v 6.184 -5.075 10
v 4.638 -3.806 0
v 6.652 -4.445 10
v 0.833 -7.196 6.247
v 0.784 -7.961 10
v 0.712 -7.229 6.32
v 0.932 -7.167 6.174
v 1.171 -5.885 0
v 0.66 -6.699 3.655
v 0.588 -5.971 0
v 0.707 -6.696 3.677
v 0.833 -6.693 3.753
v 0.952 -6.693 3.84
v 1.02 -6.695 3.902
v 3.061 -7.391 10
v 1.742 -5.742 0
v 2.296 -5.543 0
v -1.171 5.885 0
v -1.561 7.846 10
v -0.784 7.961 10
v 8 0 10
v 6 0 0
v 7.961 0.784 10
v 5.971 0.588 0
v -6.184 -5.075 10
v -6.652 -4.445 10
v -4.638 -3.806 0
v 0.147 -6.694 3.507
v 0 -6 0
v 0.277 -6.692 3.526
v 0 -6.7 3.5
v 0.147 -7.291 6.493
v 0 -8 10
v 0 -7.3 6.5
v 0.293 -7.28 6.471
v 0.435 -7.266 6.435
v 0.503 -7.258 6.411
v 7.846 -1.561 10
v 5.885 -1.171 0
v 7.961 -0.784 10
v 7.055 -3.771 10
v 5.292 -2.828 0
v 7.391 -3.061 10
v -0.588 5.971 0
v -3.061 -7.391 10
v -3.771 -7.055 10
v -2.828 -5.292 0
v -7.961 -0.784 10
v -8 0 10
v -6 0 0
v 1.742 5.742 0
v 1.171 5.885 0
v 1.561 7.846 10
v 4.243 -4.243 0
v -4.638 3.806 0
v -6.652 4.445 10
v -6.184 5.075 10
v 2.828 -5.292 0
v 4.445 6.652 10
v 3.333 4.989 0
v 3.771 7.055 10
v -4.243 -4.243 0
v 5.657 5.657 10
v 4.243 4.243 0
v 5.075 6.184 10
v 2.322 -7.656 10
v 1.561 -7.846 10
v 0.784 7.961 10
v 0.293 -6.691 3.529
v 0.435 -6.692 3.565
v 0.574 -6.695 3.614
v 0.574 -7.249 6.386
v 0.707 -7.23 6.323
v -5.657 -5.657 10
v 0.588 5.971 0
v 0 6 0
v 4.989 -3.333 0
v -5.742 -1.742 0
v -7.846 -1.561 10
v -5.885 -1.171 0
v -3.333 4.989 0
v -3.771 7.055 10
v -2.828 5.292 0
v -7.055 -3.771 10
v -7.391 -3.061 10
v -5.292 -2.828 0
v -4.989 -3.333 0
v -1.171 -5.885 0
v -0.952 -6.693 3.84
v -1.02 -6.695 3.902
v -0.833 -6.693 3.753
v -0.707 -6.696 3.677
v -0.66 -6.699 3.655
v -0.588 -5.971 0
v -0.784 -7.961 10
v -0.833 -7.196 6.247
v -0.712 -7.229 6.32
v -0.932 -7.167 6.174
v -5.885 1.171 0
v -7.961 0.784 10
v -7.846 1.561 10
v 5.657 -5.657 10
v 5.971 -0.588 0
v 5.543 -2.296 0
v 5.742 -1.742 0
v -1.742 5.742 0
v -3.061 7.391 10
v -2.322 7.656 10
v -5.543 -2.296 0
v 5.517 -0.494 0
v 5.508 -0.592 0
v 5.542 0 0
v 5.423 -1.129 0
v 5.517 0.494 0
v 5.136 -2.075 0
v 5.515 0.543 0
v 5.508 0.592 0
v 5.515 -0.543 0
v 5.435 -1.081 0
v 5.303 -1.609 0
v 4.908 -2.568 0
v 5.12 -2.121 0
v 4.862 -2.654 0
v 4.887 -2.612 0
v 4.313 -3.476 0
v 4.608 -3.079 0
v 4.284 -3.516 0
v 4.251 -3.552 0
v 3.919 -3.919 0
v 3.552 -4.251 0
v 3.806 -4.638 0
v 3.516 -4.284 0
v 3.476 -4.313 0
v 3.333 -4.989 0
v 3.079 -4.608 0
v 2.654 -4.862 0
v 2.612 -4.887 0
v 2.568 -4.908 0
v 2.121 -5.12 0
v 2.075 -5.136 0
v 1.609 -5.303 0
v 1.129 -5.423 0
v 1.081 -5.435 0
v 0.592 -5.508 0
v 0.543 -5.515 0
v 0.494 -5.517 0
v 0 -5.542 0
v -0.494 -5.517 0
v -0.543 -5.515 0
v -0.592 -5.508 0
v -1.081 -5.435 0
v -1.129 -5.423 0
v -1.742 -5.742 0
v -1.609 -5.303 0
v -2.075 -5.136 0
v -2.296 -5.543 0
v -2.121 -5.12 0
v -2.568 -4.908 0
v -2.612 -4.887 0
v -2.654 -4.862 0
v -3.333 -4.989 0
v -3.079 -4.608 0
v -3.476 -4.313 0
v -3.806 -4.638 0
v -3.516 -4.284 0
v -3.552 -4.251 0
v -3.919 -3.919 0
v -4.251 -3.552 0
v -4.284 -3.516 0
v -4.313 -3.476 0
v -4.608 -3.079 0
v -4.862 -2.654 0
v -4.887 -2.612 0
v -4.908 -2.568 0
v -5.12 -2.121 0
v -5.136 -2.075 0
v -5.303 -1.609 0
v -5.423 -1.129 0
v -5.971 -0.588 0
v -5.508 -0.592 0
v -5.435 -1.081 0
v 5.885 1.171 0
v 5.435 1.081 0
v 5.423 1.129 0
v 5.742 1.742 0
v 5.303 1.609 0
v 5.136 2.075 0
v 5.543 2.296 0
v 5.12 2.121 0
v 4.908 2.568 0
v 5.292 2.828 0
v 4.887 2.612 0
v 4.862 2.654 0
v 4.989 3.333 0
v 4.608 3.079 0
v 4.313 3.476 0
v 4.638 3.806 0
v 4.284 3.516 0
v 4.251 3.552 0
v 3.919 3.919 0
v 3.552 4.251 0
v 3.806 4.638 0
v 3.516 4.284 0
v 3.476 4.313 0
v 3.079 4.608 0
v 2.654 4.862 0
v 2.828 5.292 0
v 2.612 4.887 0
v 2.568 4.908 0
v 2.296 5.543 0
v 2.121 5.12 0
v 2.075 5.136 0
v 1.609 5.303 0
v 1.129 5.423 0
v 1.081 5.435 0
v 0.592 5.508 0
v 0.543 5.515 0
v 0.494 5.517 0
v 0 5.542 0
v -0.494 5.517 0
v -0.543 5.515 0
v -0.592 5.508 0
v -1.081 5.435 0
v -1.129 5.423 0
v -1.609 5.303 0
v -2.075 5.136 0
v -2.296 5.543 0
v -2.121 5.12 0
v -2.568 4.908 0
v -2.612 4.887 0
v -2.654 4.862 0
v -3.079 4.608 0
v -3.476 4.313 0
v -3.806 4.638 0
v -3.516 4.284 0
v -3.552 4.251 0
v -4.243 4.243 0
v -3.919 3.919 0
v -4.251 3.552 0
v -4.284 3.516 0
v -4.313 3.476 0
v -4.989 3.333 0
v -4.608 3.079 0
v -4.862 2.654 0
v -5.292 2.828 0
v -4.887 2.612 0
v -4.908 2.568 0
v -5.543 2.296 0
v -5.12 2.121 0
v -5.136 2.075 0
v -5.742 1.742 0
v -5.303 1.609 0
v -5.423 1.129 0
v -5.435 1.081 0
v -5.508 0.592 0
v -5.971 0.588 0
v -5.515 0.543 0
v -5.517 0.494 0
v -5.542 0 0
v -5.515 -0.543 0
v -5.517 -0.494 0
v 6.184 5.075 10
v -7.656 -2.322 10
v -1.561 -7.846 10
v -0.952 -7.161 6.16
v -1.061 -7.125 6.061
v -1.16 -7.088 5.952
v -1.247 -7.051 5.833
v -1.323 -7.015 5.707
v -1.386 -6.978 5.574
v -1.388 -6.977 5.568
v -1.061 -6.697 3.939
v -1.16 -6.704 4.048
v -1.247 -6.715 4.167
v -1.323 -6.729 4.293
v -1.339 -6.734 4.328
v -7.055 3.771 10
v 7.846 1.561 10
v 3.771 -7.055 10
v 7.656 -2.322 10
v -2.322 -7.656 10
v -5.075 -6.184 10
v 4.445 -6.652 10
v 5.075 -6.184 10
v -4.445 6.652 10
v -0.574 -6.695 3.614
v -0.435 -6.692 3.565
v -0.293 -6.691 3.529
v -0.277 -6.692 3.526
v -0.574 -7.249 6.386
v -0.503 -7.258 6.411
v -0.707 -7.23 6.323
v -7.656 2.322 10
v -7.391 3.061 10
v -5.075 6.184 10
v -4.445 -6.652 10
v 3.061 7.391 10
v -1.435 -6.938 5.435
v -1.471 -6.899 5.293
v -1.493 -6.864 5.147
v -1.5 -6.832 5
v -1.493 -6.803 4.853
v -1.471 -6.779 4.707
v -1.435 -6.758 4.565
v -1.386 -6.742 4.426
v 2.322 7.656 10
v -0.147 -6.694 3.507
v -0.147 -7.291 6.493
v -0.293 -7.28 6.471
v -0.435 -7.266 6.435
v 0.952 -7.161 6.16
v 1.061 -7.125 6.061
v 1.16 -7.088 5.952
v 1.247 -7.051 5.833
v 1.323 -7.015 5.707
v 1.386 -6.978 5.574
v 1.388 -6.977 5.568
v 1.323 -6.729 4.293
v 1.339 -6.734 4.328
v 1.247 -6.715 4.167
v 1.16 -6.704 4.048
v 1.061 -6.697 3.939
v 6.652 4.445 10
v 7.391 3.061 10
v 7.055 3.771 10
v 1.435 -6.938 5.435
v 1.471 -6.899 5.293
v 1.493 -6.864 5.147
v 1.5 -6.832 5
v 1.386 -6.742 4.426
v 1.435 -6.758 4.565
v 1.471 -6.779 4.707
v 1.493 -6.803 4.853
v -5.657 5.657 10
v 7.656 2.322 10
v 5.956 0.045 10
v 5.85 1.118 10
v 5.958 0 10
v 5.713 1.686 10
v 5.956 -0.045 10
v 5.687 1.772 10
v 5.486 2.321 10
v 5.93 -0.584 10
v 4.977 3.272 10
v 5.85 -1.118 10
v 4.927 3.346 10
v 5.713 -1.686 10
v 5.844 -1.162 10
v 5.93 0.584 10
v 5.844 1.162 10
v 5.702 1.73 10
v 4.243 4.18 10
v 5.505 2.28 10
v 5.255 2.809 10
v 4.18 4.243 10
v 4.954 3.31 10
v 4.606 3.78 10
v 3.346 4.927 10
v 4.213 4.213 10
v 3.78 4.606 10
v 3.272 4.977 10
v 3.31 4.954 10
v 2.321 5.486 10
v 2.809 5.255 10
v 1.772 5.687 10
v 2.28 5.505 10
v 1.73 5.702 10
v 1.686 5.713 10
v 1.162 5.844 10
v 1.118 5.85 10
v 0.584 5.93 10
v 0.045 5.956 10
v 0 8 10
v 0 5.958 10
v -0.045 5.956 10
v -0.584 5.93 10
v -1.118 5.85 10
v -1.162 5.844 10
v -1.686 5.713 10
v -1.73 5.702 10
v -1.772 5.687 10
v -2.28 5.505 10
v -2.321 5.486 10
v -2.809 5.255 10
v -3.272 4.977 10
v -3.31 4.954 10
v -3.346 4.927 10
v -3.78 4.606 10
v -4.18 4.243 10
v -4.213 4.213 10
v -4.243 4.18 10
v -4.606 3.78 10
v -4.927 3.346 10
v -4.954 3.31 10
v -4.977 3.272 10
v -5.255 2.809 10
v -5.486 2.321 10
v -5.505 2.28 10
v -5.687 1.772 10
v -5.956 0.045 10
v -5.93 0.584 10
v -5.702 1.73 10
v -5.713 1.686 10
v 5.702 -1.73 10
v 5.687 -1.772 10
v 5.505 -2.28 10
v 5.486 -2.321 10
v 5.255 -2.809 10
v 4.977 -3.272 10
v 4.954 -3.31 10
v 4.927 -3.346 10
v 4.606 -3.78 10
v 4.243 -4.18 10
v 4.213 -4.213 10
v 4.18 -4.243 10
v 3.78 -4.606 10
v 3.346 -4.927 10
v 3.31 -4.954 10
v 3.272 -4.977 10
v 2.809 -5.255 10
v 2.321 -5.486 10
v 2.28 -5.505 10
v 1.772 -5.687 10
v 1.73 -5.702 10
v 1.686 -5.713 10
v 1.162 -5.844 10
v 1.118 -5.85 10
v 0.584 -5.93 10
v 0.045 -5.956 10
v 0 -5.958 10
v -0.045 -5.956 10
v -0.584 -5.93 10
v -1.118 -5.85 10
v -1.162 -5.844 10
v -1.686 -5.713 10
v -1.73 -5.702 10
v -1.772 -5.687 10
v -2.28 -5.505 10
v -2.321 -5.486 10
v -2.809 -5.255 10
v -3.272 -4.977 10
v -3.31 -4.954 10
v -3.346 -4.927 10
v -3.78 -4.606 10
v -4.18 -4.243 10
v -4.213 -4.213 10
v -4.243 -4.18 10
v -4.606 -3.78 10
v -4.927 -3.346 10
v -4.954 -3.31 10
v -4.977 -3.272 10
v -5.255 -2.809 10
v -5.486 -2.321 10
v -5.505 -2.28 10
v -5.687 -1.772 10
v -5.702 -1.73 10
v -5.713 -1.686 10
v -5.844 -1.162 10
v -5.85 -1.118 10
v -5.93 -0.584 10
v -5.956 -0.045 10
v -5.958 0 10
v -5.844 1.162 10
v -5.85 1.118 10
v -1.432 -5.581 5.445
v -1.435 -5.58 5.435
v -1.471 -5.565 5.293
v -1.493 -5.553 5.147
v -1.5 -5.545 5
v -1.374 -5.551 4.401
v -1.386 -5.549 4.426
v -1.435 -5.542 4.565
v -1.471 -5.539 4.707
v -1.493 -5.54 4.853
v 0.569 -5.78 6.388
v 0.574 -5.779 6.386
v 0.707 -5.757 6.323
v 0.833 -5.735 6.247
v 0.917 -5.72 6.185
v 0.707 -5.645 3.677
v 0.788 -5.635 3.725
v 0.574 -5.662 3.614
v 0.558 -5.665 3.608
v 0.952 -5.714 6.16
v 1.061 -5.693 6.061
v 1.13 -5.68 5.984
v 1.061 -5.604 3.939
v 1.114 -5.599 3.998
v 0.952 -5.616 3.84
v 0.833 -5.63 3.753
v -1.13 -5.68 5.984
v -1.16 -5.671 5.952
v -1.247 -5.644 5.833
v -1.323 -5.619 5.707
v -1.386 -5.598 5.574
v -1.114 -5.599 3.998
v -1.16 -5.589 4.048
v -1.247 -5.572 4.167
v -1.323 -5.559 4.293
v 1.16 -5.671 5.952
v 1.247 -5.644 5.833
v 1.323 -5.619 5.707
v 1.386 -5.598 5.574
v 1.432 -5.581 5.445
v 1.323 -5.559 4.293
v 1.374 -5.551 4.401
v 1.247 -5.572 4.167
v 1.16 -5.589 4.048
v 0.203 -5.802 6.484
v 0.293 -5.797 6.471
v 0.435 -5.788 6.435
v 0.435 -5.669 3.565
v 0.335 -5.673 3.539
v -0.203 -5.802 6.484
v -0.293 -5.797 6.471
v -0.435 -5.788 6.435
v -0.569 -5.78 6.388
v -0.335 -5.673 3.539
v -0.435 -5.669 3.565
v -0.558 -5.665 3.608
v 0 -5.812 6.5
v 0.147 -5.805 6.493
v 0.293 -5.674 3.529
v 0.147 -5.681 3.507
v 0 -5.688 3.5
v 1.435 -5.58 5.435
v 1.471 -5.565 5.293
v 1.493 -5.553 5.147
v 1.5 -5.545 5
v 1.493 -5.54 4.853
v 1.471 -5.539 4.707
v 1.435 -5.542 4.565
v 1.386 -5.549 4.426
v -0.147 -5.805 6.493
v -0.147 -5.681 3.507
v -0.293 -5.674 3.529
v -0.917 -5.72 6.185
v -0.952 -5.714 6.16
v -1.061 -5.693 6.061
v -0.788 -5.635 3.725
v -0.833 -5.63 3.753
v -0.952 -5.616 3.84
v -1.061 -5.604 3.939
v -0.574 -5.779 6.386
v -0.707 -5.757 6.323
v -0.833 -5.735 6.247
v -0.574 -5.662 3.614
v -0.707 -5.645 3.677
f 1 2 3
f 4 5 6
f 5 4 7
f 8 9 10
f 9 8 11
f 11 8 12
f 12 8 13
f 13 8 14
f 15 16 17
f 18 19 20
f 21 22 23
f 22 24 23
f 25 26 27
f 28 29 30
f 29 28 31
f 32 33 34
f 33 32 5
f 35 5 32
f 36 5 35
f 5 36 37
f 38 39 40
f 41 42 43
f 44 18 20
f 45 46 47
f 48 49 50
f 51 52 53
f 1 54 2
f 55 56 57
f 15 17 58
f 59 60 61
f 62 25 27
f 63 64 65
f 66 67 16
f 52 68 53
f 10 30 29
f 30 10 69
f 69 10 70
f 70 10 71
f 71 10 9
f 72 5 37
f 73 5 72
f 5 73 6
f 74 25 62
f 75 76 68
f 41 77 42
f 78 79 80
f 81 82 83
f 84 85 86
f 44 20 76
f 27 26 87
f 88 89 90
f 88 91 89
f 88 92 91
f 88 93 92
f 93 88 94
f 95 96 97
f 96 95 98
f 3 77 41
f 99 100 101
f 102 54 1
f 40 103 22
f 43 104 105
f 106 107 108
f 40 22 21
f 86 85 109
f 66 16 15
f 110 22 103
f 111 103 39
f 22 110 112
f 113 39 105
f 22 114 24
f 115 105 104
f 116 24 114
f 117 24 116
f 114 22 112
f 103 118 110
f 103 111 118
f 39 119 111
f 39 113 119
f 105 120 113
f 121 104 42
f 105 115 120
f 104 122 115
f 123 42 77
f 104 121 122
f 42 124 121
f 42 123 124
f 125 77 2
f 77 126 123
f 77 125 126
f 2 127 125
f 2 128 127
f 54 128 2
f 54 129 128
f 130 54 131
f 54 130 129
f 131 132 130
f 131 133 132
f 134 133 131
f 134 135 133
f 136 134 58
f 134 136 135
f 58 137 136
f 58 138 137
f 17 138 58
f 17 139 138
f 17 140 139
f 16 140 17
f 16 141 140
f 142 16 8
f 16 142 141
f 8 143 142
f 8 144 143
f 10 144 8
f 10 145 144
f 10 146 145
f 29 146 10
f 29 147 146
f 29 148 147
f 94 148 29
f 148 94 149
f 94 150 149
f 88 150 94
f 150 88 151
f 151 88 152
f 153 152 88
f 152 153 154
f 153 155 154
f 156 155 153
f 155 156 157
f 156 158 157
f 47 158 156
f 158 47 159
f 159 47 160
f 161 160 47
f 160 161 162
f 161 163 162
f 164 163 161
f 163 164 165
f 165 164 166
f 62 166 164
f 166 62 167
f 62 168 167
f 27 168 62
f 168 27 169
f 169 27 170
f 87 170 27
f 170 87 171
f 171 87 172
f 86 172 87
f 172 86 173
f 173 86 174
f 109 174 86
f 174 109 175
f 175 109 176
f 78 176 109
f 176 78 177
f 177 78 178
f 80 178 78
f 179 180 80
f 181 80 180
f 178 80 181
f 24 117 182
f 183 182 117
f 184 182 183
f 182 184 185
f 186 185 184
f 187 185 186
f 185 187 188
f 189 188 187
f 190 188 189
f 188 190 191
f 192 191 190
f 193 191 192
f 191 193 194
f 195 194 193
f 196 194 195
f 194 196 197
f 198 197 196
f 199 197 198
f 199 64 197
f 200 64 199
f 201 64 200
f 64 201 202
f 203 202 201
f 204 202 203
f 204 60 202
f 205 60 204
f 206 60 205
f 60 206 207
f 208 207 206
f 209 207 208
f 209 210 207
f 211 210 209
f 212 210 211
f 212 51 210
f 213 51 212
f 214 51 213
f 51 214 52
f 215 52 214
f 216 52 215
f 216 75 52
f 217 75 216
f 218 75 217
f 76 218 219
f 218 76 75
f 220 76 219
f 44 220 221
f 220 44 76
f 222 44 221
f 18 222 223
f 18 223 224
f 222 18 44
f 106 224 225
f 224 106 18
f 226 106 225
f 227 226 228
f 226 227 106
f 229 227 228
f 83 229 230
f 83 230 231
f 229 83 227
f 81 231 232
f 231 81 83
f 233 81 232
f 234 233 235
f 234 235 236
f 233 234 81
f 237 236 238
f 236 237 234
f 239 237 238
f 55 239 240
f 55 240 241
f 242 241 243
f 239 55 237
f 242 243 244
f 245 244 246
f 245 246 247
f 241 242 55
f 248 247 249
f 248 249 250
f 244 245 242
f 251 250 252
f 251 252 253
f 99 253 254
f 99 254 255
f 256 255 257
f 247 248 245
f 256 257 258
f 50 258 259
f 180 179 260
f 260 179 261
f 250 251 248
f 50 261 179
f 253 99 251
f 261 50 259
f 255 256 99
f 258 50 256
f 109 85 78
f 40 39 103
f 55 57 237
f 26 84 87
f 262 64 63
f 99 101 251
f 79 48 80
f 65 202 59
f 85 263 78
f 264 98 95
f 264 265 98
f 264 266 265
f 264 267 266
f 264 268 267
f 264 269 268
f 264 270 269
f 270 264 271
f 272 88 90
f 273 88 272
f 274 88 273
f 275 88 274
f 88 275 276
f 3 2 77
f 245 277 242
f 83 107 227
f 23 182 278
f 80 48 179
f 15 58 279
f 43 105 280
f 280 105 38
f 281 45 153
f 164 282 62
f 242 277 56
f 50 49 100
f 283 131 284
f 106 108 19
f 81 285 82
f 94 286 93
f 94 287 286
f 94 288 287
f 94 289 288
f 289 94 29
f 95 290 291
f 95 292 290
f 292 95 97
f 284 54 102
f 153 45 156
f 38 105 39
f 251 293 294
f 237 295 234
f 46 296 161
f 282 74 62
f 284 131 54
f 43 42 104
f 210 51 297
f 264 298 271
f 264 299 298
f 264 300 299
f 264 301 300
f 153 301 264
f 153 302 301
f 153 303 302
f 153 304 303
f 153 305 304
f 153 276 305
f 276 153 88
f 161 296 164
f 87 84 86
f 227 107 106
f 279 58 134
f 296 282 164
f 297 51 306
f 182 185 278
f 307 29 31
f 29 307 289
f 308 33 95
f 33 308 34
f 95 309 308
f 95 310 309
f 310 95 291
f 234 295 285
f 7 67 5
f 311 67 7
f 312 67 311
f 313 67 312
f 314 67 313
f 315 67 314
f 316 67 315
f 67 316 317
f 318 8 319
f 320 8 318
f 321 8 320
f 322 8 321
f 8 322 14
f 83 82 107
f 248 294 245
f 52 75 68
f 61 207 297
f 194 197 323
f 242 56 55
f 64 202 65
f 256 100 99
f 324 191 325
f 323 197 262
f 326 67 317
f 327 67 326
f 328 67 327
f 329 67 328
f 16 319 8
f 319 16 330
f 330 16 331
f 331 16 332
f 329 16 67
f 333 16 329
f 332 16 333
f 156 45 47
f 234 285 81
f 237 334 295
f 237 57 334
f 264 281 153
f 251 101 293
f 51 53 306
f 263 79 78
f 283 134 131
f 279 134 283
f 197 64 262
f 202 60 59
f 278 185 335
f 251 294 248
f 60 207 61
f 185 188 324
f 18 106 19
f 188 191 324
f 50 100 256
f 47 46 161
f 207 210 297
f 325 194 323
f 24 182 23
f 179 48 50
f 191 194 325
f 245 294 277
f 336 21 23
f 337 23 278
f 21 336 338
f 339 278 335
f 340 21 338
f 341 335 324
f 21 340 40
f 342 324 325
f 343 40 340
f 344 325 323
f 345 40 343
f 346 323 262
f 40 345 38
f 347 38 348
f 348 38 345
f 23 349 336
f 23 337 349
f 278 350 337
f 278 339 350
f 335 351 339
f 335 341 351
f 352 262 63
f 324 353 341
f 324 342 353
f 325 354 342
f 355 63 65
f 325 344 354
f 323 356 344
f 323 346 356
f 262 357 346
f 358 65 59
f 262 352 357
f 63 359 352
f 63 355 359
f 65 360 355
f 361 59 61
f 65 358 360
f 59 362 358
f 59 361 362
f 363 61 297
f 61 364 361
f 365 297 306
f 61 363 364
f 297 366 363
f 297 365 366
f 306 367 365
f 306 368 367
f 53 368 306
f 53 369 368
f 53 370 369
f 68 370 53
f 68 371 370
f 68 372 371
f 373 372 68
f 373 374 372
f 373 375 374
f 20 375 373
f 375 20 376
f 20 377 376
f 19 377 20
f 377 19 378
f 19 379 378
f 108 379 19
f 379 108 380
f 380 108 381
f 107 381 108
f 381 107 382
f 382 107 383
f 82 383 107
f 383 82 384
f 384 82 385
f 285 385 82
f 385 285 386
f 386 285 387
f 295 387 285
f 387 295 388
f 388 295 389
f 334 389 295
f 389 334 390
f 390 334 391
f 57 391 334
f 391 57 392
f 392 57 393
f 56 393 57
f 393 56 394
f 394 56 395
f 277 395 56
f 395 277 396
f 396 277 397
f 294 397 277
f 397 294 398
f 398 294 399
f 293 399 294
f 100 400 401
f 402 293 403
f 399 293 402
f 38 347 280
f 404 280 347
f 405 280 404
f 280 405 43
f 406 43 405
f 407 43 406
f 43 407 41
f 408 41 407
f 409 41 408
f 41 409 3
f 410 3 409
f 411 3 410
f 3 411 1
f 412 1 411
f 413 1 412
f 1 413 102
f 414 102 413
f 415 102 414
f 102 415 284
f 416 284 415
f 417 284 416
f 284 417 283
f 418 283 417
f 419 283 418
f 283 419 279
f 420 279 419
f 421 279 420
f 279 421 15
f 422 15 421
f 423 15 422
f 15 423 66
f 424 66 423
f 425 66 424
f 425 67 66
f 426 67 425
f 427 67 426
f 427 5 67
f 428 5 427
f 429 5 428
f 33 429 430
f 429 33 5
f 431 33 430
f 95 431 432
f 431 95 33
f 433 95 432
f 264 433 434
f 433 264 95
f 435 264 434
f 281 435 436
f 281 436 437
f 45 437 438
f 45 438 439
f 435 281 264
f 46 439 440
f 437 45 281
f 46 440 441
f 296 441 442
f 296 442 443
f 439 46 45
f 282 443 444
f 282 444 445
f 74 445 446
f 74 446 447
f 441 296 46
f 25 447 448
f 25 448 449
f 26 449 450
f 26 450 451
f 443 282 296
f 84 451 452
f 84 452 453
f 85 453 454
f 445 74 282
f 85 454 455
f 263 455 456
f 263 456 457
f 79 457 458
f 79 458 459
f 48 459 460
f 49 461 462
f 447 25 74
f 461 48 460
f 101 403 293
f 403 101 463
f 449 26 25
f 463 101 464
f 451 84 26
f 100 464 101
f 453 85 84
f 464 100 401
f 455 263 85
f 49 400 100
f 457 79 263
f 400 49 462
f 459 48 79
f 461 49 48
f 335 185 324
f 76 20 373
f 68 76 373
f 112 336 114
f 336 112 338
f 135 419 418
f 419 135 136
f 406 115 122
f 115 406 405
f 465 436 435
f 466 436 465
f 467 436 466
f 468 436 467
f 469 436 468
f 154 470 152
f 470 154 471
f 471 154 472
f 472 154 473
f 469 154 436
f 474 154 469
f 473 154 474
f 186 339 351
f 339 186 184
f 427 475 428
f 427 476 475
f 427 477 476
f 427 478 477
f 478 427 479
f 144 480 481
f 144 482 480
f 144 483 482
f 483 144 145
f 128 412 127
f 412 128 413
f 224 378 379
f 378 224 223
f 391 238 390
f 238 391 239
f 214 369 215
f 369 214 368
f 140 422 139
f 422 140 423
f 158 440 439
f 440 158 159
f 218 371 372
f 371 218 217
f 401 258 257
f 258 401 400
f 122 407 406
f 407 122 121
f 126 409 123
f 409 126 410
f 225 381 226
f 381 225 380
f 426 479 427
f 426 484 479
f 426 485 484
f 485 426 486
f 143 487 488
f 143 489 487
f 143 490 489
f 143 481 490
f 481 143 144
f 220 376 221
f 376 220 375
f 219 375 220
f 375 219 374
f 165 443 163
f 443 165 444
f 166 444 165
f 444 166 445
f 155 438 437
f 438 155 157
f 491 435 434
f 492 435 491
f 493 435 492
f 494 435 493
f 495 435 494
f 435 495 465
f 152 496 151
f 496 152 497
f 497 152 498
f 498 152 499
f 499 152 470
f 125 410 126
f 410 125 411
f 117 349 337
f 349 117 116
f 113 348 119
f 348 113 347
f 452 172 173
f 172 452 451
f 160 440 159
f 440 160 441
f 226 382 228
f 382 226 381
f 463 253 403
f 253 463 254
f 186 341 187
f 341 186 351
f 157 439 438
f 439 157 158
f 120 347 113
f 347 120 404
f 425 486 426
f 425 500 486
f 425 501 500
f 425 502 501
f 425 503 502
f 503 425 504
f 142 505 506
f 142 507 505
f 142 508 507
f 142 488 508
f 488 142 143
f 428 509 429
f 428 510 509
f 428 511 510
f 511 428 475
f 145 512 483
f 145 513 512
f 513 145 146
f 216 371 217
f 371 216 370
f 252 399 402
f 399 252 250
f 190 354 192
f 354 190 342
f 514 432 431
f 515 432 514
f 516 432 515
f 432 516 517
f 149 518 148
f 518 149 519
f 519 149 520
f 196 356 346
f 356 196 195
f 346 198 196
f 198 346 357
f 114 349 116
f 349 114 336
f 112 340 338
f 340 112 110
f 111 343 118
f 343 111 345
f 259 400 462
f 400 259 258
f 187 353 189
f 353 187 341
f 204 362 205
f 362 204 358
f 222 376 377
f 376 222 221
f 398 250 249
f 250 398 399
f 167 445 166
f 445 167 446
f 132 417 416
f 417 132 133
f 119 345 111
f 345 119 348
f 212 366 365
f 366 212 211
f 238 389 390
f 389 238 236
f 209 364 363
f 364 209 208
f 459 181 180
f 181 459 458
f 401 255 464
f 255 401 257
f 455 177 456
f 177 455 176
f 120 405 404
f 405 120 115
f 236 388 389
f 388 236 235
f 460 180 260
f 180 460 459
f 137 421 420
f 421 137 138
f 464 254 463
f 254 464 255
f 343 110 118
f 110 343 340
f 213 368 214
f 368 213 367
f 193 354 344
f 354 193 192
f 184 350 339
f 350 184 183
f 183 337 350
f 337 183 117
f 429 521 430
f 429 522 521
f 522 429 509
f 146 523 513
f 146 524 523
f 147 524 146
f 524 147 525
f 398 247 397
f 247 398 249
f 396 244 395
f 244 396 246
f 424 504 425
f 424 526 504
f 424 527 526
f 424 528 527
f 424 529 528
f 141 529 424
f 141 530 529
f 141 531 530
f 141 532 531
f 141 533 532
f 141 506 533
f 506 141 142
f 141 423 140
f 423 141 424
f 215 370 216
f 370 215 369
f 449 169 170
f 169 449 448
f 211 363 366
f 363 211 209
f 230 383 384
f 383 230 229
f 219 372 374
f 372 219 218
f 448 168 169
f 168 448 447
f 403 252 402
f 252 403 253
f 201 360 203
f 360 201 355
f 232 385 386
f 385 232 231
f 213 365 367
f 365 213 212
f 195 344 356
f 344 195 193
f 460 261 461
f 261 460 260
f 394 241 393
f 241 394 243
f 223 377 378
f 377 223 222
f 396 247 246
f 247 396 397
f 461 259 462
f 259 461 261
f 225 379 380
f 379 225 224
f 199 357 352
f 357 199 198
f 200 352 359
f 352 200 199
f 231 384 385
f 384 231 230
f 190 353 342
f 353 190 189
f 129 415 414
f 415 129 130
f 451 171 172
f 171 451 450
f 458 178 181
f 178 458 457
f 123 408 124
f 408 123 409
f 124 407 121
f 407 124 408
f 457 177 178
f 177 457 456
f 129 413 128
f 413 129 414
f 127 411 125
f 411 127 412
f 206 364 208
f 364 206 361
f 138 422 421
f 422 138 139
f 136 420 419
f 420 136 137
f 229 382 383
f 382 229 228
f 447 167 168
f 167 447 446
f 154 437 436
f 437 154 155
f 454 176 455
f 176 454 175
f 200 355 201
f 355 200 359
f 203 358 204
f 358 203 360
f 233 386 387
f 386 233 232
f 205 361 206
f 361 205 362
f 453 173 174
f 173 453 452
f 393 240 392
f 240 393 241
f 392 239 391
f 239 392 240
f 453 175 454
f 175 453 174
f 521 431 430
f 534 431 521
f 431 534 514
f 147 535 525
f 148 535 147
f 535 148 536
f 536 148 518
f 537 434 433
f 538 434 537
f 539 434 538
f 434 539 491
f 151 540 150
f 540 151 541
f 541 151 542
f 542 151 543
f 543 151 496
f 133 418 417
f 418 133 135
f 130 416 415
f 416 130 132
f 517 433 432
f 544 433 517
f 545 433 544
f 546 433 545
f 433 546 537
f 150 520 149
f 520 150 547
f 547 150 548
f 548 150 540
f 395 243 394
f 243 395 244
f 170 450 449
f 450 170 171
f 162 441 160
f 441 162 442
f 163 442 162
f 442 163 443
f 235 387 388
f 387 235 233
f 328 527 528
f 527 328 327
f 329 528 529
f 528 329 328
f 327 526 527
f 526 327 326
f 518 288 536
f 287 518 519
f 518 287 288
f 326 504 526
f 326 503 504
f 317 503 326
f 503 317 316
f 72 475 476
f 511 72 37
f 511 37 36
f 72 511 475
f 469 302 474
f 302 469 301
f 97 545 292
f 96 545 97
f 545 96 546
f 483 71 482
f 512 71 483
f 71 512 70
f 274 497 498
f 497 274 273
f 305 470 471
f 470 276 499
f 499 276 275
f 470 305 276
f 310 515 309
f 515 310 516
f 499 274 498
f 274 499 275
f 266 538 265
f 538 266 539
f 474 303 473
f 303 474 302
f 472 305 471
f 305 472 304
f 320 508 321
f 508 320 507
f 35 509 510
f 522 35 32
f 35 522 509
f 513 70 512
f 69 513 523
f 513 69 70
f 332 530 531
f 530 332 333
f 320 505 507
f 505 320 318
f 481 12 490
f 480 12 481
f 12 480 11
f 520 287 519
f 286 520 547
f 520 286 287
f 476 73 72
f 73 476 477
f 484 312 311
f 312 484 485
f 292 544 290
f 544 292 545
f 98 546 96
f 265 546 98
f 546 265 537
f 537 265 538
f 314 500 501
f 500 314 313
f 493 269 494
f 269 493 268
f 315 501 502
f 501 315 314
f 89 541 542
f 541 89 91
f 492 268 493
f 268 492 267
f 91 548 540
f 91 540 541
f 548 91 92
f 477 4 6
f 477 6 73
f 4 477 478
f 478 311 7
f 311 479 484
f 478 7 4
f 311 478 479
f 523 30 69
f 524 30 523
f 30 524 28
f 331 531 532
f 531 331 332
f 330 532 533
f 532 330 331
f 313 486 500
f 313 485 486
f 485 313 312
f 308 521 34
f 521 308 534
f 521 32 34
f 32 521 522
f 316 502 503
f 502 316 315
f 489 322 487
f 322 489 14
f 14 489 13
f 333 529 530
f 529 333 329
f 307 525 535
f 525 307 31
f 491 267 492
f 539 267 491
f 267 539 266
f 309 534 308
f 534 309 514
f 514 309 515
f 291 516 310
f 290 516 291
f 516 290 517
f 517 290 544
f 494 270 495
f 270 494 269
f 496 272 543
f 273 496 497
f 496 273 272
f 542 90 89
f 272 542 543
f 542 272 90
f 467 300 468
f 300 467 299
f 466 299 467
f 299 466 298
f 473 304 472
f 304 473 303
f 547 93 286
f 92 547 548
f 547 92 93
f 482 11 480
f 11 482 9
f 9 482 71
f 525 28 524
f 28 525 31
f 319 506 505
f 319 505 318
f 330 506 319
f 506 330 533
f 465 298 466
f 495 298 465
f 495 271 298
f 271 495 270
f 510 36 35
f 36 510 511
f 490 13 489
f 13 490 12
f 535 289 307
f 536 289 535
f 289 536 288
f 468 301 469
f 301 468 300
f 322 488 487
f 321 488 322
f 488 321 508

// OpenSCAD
$fn = 64;

difference(){

cylinder(r1=6,r2=8,h=10);
translate([0,0,-1])cylinder(r1=11/2,r2=12/2,h=12);
translate([0,0,5]) rotate([90,0,0])cylinder(r=1.5,h=10);
}
